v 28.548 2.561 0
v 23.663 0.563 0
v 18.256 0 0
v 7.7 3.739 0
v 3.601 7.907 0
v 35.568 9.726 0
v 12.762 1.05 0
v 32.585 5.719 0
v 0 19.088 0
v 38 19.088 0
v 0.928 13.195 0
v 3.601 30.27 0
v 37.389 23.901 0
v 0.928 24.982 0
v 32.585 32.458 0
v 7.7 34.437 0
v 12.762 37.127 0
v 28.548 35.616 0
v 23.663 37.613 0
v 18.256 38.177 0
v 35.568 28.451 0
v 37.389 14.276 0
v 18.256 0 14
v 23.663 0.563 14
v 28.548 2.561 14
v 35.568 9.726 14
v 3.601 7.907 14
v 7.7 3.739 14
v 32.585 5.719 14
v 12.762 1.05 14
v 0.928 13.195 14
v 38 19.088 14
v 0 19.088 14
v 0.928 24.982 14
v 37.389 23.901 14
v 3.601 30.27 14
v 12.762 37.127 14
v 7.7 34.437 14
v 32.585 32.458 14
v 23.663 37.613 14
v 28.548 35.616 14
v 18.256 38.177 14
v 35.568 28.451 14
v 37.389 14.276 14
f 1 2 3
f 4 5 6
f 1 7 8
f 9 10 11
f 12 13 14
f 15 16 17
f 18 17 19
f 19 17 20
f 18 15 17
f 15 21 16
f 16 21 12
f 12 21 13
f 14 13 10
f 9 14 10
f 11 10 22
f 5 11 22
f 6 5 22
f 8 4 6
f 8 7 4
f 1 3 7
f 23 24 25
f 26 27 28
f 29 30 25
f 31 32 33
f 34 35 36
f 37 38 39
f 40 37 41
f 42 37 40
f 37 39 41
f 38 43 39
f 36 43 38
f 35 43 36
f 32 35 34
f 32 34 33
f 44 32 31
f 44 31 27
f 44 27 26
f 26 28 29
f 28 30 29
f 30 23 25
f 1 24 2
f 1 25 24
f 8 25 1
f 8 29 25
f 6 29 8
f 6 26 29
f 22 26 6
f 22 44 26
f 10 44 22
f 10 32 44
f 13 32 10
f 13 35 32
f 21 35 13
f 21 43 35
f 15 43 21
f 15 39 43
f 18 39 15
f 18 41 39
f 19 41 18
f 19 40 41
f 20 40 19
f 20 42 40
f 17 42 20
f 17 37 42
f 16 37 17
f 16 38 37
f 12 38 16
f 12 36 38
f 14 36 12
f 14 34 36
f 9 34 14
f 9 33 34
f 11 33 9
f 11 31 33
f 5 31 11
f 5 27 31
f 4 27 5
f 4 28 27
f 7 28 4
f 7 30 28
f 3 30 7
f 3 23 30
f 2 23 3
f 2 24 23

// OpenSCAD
$fn = 32;

// ----------------------------------------------------------------------
// Cam disc: base radius 17.0 mm, lift 4.0 mm, 22 profile points
// ----------------------------------------------------------------------

// --- parameters (mm) ---
profile_height = 14;      // extrusion height
profile_points = 22;      // points of the closed outline

profile = [[38, 19.088], [37.389, 23.901], [35.568, 28.451], [32.585, 32.458], [28.548, 35.616], [23.663, 37.613], [18.256, 38.177], [12.762, 37.127], [7.7, 34.437], [3.601, 30.27], [0.928, 24.982], [0, 19.088], [0.928, 13.195], [3.601, 7.907], [7.7, 3.739], [12.762, 1.05], [18.256, 0], [23.663, 0.563], [28.548, 2.561], [32.585, 5.719], [35.568, 9.726], [37.389, 14.276]];  // single closed polygon, 22 points, counter clockwise

// --- the one profile operation ---
linear_extrude(height = profile_height) polygon(points = profile);
